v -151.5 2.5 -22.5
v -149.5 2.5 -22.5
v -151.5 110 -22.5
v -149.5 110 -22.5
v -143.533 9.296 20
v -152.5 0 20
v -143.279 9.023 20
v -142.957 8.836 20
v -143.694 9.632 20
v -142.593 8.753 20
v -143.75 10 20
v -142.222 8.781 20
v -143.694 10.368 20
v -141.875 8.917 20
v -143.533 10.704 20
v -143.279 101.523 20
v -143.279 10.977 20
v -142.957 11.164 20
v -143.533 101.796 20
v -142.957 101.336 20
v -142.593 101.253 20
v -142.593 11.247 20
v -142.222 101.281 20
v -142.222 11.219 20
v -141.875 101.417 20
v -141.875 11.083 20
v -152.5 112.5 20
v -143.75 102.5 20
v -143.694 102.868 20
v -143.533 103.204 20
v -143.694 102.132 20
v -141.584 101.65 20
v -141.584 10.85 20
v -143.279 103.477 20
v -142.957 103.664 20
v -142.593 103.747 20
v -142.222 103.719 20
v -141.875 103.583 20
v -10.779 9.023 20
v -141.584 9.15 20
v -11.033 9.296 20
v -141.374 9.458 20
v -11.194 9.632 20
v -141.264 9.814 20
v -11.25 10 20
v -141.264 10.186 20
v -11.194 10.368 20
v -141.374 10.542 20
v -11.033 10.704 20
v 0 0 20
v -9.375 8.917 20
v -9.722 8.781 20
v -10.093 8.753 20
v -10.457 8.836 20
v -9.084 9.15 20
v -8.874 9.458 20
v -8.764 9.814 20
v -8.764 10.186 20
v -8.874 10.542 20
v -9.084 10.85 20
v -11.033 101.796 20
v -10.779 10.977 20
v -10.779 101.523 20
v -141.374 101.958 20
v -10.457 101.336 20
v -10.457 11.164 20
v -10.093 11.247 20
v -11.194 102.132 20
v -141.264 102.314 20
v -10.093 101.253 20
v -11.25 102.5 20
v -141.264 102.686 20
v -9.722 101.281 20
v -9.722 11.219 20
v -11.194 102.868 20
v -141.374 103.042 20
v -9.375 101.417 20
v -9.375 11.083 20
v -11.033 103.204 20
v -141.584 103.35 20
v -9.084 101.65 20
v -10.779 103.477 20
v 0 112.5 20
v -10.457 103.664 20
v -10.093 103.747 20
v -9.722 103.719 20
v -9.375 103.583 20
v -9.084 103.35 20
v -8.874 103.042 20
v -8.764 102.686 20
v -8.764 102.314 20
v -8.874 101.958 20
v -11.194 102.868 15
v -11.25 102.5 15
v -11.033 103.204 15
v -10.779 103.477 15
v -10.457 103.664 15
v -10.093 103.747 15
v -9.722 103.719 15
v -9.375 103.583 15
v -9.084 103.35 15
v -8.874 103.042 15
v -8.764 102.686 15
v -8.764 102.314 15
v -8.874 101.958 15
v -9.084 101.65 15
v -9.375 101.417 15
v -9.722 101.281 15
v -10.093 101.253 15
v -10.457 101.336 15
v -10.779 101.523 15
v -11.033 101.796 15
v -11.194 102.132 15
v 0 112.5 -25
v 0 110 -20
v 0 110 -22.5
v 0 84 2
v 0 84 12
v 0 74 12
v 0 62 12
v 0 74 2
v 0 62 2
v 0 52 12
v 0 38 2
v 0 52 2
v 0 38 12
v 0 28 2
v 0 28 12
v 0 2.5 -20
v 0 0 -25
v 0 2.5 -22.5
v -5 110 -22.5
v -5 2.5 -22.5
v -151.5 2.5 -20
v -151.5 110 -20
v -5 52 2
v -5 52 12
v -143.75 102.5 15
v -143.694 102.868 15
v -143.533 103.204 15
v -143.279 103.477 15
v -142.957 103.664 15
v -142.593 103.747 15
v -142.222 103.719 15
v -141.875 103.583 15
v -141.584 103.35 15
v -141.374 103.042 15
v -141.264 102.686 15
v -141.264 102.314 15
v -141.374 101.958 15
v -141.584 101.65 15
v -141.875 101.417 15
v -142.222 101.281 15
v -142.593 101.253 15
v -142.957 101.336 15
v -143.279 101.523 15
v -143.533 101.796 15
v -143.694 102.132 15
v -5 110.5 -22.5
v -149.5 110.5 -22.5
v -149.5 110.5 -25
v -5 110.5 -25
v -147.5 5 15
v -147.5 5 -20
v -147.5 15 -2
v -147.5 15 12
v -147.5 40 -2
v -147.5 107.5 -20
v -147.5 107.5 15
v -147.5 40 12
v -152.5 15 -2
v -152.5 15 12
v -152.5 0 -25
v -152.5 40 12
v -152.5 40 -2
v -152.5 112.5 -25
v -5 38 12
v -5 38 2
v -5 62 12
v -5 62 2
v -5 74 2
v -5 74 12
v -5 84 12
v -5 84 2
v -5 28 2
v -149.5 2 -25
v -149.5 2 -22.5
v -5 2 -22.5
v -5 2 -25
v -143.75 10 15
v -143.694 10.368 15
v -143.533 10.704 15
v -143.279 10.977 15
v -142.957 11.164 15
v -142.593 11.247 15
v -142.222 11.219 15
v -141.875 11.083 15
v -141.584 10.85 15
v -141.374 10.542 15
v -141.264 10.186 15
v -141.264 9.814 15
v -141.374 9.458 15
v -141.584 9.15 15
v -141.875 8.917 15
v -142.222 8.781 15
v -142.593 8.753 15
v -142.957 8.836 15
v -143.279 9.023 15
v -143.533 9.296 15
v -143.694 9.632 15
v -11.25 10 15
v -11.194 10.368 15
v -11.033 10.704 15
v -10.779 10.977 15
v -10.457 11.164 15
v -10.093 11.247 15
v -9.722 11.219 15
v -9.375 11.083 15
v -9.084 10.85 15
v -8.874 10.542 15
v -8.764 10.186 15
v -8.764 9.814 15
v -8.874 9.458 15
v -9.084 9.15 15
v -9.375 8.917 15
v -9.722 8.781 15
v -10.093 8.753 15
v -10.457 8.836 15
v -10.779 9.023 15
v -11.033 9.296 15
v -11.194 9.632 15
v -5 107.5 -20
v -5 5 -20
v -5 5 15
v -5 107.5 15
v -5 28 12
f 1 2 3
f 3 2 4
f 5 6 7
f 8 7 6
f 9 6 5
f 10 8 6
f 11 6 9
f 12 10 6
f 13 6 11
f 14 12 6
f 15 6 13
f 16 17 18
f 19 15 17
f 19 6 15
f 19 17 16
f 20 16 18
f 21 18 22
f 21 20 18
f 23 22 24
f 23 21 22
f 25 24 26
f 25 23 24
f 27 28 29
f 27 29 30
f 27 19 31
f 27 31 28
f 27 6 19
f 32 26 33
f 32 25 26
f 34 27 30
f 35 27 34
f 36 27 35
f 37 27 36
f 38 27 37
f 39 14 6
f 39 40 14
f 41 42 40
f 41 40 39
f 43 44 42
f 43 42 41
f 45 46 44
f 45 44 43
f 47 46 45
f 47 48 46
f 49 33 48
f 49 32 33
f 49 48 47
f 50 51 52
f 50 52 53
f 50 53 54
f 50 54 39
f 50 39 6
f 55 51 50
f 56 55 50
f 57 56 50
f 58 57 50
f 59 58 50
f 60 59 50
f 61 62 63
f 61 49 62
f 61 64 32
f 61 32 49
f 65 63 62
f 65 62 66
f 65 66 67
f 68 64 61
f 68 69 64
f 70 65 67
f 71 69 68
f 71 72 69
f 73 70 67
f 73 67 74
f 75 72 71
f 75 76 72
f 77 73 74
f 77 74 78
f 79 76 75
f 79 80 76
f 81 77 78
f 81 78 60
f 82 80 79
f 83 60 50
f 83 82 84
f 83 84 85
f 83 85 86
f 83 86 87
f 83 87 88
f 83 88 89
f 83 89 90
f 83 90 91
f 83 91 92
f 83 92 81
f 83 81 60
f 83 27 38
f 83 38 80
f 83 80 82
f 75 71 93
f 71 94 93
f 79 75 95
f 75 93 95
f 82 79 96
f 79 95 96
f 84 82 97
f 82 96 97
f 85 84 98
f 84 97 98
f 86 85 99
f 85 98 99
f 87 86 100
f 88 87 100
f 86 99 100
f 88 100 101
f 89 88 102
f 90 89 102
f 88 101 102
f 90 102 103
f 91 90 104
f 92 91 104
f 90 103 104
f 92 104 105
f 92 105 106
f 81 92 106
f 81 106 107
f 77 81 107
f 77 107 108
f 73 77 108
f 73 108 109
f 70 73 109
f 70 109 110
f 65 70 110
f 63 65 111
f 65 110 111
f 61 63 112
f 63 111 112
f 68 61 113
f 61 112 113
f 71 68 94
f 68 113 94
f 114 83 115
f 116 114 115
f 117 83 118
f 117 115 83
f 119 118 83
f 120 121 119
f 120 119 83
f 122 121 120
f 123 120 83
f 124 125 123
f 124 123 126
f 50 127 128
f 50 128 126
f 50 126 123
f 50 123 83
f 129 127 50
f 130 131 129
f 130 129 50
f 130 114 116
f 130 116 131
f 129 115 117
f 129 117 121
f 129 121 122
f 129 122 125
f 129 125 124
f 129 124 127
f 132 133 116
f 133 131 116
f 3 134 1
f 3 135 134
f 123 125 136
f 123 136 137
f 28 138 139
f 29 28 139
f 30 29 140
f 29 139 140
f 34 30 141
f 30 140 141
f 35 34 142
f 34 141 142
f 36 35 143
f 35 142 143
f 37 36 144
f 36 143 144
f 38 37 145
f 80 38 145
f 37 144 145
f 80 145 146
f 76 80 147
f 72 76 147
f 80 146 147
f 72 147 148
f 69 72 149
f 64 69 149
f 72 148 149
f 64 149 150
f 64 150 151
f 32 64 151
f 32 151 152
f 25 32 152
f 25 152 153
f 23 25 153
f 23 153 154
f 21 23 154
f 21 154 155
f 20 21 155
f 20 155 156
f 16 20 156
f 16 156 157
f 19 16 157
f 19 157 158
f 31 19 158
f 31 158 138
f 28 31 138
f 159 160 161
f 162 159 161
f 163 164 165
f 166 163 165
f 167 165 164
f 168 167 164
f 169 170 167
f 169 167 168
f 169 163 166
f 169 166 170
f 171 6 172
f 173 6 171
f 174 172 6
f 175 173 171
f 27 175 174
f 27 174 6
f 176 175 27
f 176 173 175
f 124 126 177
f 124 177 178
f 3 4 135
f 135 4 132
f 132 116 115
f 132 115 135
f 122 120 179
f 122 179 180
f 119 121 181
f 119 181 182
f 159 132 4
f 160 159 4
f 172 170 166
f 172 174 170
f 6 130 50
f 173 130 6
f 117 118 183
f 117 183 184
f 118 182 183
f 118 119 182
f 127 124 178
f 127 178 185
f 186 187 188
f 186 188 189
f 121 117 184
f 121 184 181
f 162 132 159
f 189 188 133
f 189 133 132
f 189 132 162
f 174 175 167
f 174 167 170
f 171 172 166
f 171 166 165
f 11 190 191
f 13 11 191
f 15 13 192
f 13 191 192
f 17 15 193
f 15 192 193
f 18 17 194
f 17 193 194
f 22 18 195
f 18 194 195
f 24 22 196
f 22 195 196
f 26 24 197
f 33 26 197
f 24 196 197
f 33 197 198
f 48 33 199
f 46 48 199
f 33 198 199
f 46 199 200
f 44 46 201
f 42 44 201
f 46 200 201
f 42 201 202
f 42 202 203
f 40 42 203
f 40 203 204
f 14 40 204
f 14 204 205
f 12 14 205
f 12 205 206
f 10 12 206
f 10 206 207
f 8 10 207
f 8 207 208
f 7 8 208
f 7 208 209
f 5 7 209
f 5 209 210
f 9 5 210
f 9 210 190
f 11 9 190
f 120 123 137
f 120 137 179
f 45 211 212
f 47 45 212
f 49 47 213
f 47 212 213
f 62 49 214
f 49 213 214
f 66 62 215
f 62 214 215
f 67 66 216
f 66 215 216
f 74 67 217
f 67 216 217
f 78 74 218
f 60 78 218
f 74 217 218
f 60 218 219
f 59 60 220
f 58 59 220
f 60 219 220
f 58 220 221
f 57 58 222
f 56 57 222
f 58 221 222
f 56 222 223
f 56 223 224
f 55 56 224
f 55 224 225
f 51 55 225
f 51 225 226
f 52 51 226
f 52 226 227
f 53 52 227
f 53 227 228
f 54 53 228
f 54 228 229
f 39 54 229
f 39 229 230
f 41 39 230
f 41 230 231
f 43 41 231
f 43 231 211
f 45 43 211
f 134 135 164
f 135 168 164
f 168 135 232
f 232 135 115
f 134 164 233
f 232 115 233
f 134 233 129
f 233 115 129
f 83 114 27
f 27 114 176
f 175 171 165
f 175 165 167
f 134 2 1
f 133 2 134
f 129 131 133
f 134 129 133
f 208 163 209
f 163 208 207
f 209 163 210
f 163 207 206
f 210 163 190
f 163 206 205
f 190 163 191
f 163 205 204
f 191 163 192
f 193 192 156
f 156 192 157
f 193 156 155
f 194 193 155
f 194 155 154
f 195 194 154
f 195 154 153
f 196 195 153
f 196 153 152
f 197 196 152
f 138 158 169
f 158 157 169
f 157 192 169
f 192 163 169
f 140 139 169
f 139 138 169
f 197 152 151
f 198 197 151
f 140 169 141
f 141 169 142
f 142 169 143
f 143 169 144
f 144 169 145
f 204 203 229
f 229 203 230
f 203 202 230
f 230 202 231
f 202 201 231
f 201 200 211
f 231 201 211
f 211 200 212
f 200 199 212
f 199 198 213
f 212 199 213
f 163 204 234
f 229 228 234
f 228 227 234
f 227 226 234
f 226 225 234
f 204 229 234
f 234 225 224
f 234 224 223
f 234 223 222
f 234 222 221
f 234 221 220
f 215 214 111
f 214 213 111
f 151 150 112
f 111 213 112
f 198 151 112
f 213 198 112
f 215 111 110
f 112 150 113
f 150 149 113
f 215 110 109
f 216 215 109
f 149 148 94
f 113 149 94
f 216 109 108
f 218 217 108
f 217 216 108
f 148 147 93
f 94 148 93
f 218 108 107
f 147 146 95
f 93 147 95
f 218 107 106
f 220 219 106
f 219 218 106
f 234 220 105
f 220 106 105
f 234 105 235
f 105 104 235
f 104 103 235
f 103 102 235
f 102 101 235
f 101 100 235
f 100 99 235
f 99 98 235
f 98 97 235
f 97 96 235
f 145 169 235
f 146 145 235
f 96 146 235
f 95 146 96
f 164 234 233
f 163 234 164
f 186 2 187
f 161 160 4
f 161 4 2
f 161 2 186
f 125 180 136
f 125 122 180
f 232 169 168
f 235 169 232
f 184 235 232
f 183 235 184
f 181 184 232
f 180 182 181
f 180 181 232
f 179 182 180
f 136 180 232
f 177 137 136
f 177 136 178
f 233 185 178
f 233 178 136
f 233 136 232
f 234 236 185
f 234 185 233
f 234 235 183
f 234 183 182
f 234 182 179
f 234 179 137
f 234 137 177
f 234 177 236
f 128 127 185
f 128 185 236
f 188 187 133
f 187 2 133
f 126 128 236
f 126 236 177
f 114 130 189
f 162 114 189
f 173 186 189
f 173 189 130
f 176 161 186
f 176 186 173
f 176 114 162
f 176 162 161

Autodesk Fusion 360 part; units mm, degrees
sketch "Sketch1" plane through (0, 0, 0) normal (0, 0, 1) x (1, 0, 0)
  line L0 (0, 0) -> (-152.5, 0)
  line L1 (-152.5, 0) -> (-152.5, 112.5)
  line L2 (-152.5, 112.5) -> (0, 112.5)
  line L3 (0, 112.5) -> (0, 0)
  line L4 (-152.5, 112.5) -> (-147.5, 112.5)
  line L5 (0, 0) -> (0, 5)
  line L6 (-147.5, 107.5) -> (-5, 107.5)
  line L7 (-5, 107.5) -> (-5, 5)
  line L8 (-5, 5) -> (-147.5, 5)
  line L9 (-147.5, 5) -> (-147.5, 107.5)
  dimension "d1" = 152.5
  dimension "d2" = 112.5
  dimension "d3" = 5
  dimension "d4" = 5
  dimension "d5" = 5
  dimension "d6" = 5
extrude "Extrude1" add sketch "Sketch1" along normal blind 5 contours L0 L1 L2 L3 L4 L5 | L6 L7 L8 L9
sketch "Sketch2" plane through (0, 0, 0) normal (0, 0, -1) x (-1, 0, 0)
  line L0 (0, 0) -> (152.5, 0)
  line L1 (152.5, 0) -> (152.5, 112.5)
  line L2 (152.5, 112.5) -> (0, 112.5)
  line L3 (0, 112.5) -> (0, 0)
  line L4 (152.5, 112.5) -> (147.5, 112.5)
  line L5 (147.5, 112.5) -> (147.5, 107.5)
  line L6 (0, 0) -> (0, 5)
  line L7 (0, 5) -> (5, 5)
  line L8 (147.5, 107.5) -> (5, 107.5)
  line L9 (5, 107.5) -> (5, 5)
  line L10 (5, 5) -> (147.5, 5)
  line L11 (147.5, 5) -> (147.5, 107.5)
  dimension "d9" = 5
  dimension "d10" = 5
  dimension "d11" = 5
extrude "Extrude2" add sketch "Sketch2" along normal blind 25 contours L0 L1 L2 L3 L4 L5 L6 L7 L10 L11 | L2 L3 L5 L7 L8 L9
sketch "Sketch3" plane through (0, 0, 0) normal (1, 0, 0) x (0, 0, -1)
  line L0 (25, 112.5) -> (-5, 112.5)
  line L1 (-5, 112.5) -> (-5, 0)
  line L2 (-5, 0) -> (25, 0)
  line L3 (25, 0) -> (25, 112.5)
  line L4 (-5, 0) -> (-5, 20)
  line L5 (-5, 20) -> (-5, 45)
  line L6 (-5, 45) -> (-5, 70)
  line L7 (-5, 70) -> (10, 70)
  line L8 (-5, 45) -> (10, 45)
  line L9 (-5, 20) -> (10, 20)
  line L10 (10, 70) -> (10, 75)
  line L11 (10, 70) -> (10, 65)
  line L12 (10, 45) -> (10, 50)
  line L13 (10, 45) -> (10, 40)
  line L14 (10, 20) -> (10, 25)
  line L15 (10, 20) -> (10, 15)
  line L16 (10, 75) -> (5, 75)
  line L17 (10, 65) -> (15, 65)
  line L18 (10, 50) -> (5, 50)
  line L19 (10, 40) -> (15, 40)
  line L20 (10, 25) -> (5, 25)
  line L21 (10, 15) -> (15, 15)
  line L22 (5, 75) -> (15, 75)
  line L23 (15, 75) -> (15, 65)
  line L24 (15, 65) -> (5, 65)
  line L25 (5, 65) -> (5, 75)
  line L26 (5, 50) -> (15, 50)
  line L27 (15, 50) -> (15, 40)
  line L28 (15, 40) -> (5, 40)
  line L29 (5, 40) -> (5, 50)
  line L30 (5, 25) -> (15, 25)
  line L31 (15, 25) -> (15, 15)
  line L32 (15, 15) -> (5, 15)
  line L33 (5, 15) -> (5, 25)
  dimension "d14" = 25
  dimension "d15" = 5
  dimension "d16" = 5
  dimension "d17" = 5
  dimension "d18" = 5
  dimension "d19" = 5
  dimension "d20" = 5
  dimension "d21" = 5
  dimension "d22" = 5
  dimension "d23" = 5
  dimension "d24" = 5
extrude "Extrude3" cut sketch "Sketch3" against normal blind 10 contours L7 L10 L16 L22 L25 | L7 L11 L24 L25 | L8 L12 L18 L26 L29 | L8 L13 L28 L29 | L9 L14 L20 L30 L33 | L9 L15 L32 L33 | L10 L11 L17 L22 L23 L24 | L12 L13 L19 L26 L27 L28 | L14 L15 L21 L30 L31 L32
sketch "Sketch4" plane through (0, 0, 0) normal (0, 0, -1) x (-1, 0, 0)
  line L0 (147.5, 107.5) -> (5, 107.5)
  line L1 (5, 107.5) -> (5, 5)
  line L2 (5, 5) -> (147.5, 5)
  line L3 (147.5, 5) -> (147.5, 107.5)
  line L4 (5, 107.5) -> (5, 102.5)
  line L5 (5, 5) -> (5, 10)
  line L6 (10, 10) -> (142.5, 10)
  line L7 (10, 102.5) -> (142.5, 102.5)
  line L8 (142.5, 102.5) -> (142.5, 10)
  line L9 (10, 102.5) -> (10, 10)
  circle A0 centre (10, 102.5) radius 1.25
  circle A1 centre (10, 10) radius 1.25
  circle A2 centre (142.5, 10) radius 1.25
  circle A3 centre (142.5, 102.5) radius 1.25
  dimension "d27" = 5
  dimension "d28" = 132.5
  dimension "d29" = 132.5
  dimension "d30" = 2.5
  dimension "d31" = 2.5
  dimension "d32" = 2.5
  dimension "d33" = 2.5
extrude "Extrude4" cut sketch "Sketch4" against normal blind 20 contours L6 L9 A1 | L6 L9 A1 | L6 L8 A2 | L6 L8 A2 | L7 L9 A0 | L7 L9 A0 | L7 L8 A3 | L7 L8 A3
extrude "Extrude5" add 1 faces at (-54.5498, 41.1167, 5) along direction (0, 0, 1) blind 10
sketch "Sketch5" plane through (0, 0, 0) normal (1, 0, 0) x (0, 0, -1)
  line L0 (15, 25) -> (15, 15)
  line L1 (15, 15) -> (5, 15)
  line L2 (5, 15) -> (5, 25)
  line L3 (5, 25) -> (15, 25)
  line L4 (15, 50) -> (15, 40)
  line L5 (15, 40) -> (5, 40)
  line L6 (5, 40) -> (5, 50)
  line L7 (5, 50) -> (15, 50)
  line L8 (15, 75) -> (15, 65)
  line L9 (15, 65) -> (5, 65)
  line L10 (5, 65) -> (5, 75)
  line L11 (5, 75) -> (15, 75)
  line L12 (25, 112.5) -> (-15, 112.5)
  line L13 (-15, 112.5) -> (-15, 0)
  line L14 (-15, 0) -> (25, 0)
  line L15 (25, 0) -> (25, 112.5)
  line L16 (25, 112.5) -> (22.5, 112.5)
  line L17 (22.5, 112.5) -> (22.5, 110)
  line L18 (25, 0) -> (22.5, 0)
  line L19 (22.5, 0) -> (22.5, 2.5)
  line L20 (22.5, 110) -> (20, 110)
  line L21 (22.5, 2.5) -> (20, 2.5)
  line L22 (22.5, 110) -> (20, 110)
  line L23 (20, 110) -> (20, 2.5)
  line L24 (20, 2.5) -> (22.5, 2.5)
  line L25 (22.5, 2.5) -> (22.5, 110)
  dimension "d38" = 2.5
  dimension "d39" = 2.5
  dimension "d40" = 2.5
extrude "Extrude6" cut sketch "Sketch5" against normal blind 150.5 contours L20 L21 L22 L23 L24 L25
extrude "Extrude7" cut 1 faces at (-147.5, 39.1667, -23.3333) along direction (-1, 0, 0) blind 1
extrude "Extrude8" cut 1 faces at (-148.5, 39.1667, -23.3333) along direction (-1, 0, 0) blind 1
extrude "Extrude9" cut 1 faces at (-150.5, 74.1667, -20.8333) along direction (-1, 0, 0) blind 1
extrude "Extrude10" cut 1 faces at (-101.3333, 107.5, -23.3333) along direction (0, 1, 0) blind 3
extrude "Extrude11" cut 1 faces at (-53.1667, 5, -24.1667) along direction (0, -1, 0) blind 3
extrude "Extrude12" add 1 faces at (-54.5498, 41.1167, 15) along direction (0, 0, 1) blind 5
extrude "Extrude13" cut 1 faces at (-54.5555, 41.0963, 0) along direction (0, 0, 1) blind 15
sketch "Sketch6" plane through (0, 0, 0) normal (1, 0, 0) x (0, 0, -1)
  line L0 (20, 110) -> (22.5, 110)
  line L1 (22.5, 110) -> (22.5, 2.5)
  line L2 (22.5, 2.5) -> (20, 2.5)
  line L3 (20, 2.5) -> (20, 110)
  line L4 (15, 25) -> (15, 15)
  line L5 (15, 15) -> (5, 15)
  line L6 (5, 15) -> (5, 25)
  line L7 (5, 25) -> (15, 25)
  line L8 (15, 50) -> (15, 40)
  line L9 (15, 40) -> (5, 40)
  line L10 (5, 40) -> (5, 50)
  line L11 (5, 50) -> (15, 50)
  line L12 (15, 75) -> (15, 65)
  line L13 (15, 65) -> (5, 65)
  line L14 (5, 65) -> (5, 75)
  line L15 (5, 75) -> (15, 75)
  line L16 (25, 112.5) -> (-20, 112.5)
  line L17 (-20, 112.5) -> (-20, 0)
  line L18 (-20, 0) -> (25, 0)
  line L19 (25, 0) -> (25, 112.5)
sketch "Sketch7" plane through (0, 0, 0) normal (1, 0, 0) x (0, 0, -1)
sketch "Sketch8" plane through (0, 0, 0) normal (1, 0, 0) x (0, 0, -1)
  line L0 (-14, 84) -> (-4, 84)
  line L1 (-4, 84) -> (-4, 74)
  line L2 (-4, 74) -> (-14, 74)
  line L3 (-14, 74) -> (-14, 84)
  line L4 (-14, 62) -> (-4, 62)
  line L5 (-4, 62) -> (-4, 52)
  line L6 (-4, 52) -> (-14, 52)
  line L7 (-14, 52) -> (-14, 62)
  line L8 (-14, 38) -> (-4, 38)
  line L9 (-4, 38) -> (-4, 28)
  line L10 (-4, 28) -> (-14, 28)
  line L11 (-14, 28) -> (-14, 38)
extrude "Extrude14" add sketch "Sketch6" against normal blind 5 contours L4 L5 L6 L7 | L8 L9 L10 L11 | L12 L13 L14 L15
extrude "Extrude15" cut sketch "Sketch8" against normal blind 5
sketch "Sketch9" plane through (-152.5, 0, 0) normal (-1, 0, 0) x (0, 0, 1)
  line L0 (-25, 0) -> (20, 0)
  line L1 (20, 0) -> (20, 112.5)
  line L2 (20, 112.5) -> (-25, 112.5)
  line L3 (-25, 112.5) -> (-25, 0)
  line L4 (12, 15) -> (-2, 15)
  line L5 (-2, 15) -> (-2, 40)
  line L6 (-2, 40) -> (12, 40)
  line L7 (12, 40) -> (12, 15)
extrude "Extrude16" cut sketch "Sketch9" against normal blind 5 contours L4 L5 L6 L7
sketch "Sketch10" plane through (0, 0, 0) normal (1, 0, 0) x (0, 0, -1)
  line L0 (-4, 84) -> (-4, 74)
  line L1 (-4, 74) -> (-14, 74)
  line L2 (-14, 74) -> (-14, 84)
  line L3 (-14, 84) -> (-4, 84)
  line L4 (-4, 62) -> (-4, 52)
  line L5 (-4, 52) -> (-14, 52)
  line L6 (-14, 52) -> (-14, 62)
  line L7 (-14, 62) -> (-4, 62)
  line L8 (-4, 38) -> (-4, 28)
  line L9 (-4, 28) -> (-14, 28)
  line L10 (-14, 28) -> (-14, 38)
  line L11 (-14, 38) -> (-4, 38)
  line L12 (20, 110) -> (22.5, 110)
  line L13 (22.5, 110) -> (22.5, 2.5)
  line L14 (22.5, 2.5) -> (20, 2.5)
  line L15 (20, 2.5) -> (20, 110)
  line L16 (25, 112.5) -> (-20, 112.5)
  line L17 (-20, 112.5) -> (-20, 0)
  line L18 (-20, 0) -> (25, 0)
  line L19 (25, 0) -> (25, 112.5)
  line L20 (-4, 84) -> (-2, 84)
  line L21 (-2, 84) -> (-2, 74)
  line L22 (-2, 74) -> (-4, 74)
  line L23 (-4, 74) -> (-4, 84)
  line L24 (-4, 62) -> (-2, 62)
  line L25 (-2, 62) -> (-2, 52)
  line L26 (-2, 52) -> (-4, 52)
  line L27 (-4, 52) -> (-4, 62)
  line L28 (-4, 38) -> (-2, 38)
  line L29 (-2, 38) -> (-2, 28)
  line L30 (-2, 28) -> (-4, 28)
  line L31 (-4, 28) -> (-4, 38)
  line L32 (-14, 28) -> (-12, 28)
  line L33 (-12, 28) -> (-12, 84)
  line L34 (-12, 84) -> (-14, 84)
  line L35 (-14, 84) -> (-14, 28)
extrude "Extrude17" add sketch "Sketch10" against normal blind 5 contours L1 L2 L3 L33 L34 L35 | L5 L6 L7 L33 L35 | L9 L10 L11 L32 L33 L35
sketch "Sketch11" plane through (0, 0, 0) normal (1, 0, 0) x (0, 0, -1)
  line L0 (-4, 84) -> (-4, 74)
  line L1 (-4, 74) -> (-12, 74)
  line L2 (-12, 74) -> (-12, 84)
  line L3 (-12, 84) -> (-4, 84)
  line L4 (-4, 62) -> (-4, 52)
  line L5 (-4, 52) -> (-12, 52)
  line L6 (-12, 52) -> (-12, 62)
  line L7 (-12, 62) -> (-4, 62)
  line L8 (-4, 38) -> (-4, 28)
  line L9 (-4, 28) -> (-12, 28)
  line L10 (-12, 28) -> (-12, 38)
  line L11 (-12, 38) -> (-4, 38)
  line L12 (20, 110) -> (22.5, 110)
  line L13 (22.5, 110) -> (22.5, 2.5)
  line L14 (22.5, 2.5) -> (20, 2.5)
  line L15 (20, 2.5) -> (20, 110)
  line L16 (25, 112.5) -> (-20, 112.5)
  line L17 (-20, 112.5) -> (-20, 0)
  line L18 (-20, 0) -> (25, 0)
  line L19 (25, 0) -> (25, 112.5)
  line L20 (-4, 62) -> (-2, 62)
  line L21 (-2, 62) -> (-2, 52)
  line L22 (-2, 52) -> (-4, 52)
  line L23 (-4, 52) -> (-4, 62)
  line L24 (-4, 38) -> (-2, 38)
  line L25 (-2, 38) -> (-2, 28)
  line L26 (-2, 28) -> (-4, 28)
  line L27 (-4, 28) -> (-4, 38)
  line L28 (-4, 84) -> (-2, 84)
  line L29 (-2, 84) -> (-2, 74)
  line L30 (-2, 74) -> (-4, 74)
  line L31 (-4, 74) -> (-4, 84)
extrude "Extrude18" cut sketch "Sketch11" against normal blind 5 contours L0 L28 L29 L30 L31 | L4 L20 L21 L22 L23 | L8 L24 L25 L26 L27
